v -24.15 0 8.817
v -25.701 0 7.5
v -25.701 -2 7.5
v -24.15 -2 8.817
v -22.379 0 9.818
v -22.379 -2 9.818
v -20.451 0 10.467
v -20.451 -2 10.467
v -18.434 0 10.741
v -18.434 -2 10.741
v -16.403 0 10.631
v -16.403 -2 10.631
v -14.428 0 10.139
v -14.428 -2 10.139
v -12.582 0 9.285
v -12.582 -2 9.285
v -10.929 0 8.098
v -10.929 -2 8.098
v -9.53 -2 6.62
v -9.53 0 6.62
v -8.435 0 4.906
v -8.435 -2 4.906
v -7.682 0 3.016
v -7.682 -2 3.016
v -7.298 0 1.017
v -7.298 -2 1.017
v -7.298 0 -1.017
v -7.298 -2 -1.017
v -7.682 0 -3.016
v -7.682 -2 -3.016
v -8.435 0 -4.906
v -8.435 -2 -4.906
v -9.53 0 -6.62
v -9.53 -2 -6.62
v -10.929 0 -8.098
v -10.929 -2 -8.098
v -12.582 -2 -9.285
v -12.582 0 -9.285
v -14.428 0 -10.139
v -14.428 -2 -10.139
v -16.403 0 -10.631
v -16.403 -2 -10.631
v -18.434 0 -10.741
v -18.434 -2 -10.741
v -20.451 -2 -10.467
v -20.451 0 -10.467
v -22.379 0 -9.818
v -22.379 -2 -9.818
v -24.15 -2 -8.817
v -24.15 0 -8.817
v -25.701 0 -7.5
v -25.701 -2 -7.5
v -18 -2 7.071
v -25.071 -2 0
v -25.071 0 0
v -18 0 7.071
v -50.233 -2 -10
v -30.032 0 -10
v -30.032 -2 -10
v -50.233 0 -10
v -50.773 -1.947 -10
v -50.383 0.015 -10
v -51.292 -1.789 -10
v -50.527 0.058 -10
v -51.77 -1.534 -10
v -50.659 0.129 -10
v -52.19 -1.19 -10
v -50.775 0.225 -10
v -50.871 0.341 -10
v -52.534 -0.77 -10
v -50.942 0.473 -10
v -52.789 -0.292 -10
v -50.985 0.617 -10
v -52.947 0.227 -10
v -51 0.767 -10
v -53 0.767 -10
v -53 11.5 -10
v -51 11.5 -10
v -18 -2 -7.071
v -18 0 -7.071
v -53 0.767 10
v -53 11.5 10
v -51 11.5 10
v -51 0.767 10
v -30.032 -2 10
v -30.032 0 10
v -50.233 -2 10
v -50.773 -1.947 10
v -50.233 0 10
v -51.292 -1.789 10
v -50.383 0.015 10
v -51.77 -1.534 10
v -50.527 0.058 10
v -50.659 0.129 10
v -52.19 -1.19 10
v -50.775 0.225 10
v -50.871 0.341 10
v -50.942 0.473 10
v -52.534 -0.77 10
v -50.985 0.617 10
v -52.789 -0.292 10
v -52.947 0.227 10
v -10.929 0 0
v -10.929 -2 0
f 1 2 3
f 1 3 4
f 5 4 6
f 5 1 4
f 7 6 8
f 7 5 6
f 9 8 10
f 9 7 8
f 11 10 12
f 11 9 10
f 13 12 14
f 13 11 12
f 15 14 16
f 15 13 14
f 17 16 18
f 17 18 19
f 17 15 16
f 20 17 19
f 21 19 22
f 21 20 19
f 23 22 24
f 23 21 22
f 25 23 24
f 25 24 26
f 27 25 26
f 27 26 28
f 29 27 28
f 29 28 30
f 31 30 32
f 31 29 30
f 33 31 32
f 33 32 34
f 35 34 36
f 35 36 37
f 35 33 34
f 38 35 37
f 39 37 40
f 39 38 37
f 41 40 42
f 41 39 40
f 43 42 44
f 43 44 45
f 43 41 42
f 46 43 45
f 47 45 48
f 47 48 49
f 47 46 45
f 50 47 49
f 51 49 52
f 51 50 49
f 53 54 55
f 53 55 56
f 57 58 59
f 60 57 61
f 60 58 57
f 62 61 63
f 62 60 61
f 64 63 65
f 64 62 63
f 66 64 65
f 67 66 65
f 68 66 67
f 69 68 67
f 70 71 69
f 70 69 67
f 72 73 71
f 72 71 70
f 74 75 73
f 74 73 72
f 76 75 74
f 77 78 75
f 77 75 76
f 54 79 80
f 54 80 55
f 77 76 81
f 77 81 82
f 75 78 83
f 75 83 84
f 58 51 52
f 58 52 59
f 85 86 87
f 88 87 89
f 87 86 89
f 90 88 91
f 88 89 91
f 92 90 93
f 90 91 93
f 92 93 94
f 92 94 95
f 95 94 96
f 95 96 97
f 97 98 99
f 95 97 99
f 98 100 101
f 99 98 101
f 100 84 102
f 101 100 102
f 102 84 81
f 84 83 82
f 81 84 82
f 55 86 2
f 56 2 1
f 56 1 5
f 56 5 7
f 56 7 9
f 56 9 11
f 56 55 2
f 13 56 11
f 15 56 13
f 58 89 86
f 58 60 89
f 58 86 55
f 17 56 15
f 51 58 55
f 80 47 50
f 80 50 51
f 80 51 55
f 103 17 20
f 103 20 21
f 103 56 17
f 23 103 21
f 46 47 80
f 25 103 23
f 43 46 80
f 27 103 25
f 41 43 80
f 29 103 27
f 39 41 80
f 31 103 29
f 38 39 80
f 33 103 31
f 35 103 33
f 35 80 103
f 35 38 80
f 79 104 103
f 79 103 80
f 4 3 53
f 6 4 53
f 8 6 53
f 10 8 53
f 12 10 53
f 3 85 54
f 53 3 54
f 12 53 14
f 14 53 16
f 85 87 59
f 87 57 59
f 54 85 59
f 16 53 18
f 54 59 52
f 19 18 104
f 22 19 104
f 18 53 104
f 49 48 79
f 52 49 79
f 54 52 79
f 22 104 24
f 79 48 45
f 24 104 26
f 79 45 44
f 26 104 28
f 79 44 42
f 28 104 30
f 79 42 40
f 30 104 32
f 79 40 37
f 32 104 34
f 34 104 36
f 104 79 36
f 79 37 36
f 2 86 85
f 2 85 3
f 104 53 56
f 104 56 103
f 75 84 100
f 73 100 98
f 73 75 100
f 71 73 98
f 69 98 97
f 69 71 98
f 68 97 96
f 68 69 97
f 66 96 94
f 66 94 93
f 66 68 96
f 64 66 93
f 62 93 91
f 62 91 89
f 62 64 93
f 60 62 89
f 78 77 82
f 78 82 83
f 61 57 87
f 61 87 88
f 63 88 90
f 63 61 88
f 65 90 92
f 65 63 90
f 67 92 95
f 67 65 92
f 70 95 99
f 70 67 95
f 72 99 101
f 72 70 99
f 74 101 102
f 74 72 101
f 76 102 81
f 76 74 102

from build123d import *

# Parameters (mm, degrees)
SM_BASE_FLANGE_1_DEPTH           = 2
SM_EDGE_FLANGE_1_STRIP_W         = 9.5332
SM_EDGE_FLANGE_1_STRIP_H         = 2
SM_EDGE_FLANGE_1_STRIP_CUT_DEPTH = 20
SM_EDGE_FLANGE_1_DEPTH           = 20
CUT_EXTRUDE_1_DEPTH              = 57.15881498


# Sheet-metal steps are written as plain solids
with BuildPart() as part:
    # Sketch 2 → 基体-法兰1 (new body)
    with BuildSketch(Plane(origin=(0, 0, 0), x_dir=(1, 0, 0), z_dir=(0, 1, 0))):
        with BuildLine():
            Line((-30.031587919, -10), (-25.7014609, -7.5))
            ThreePointArc((-25.7014609, -7.5), (-7.25, 0), (-25.7014609, 7.5))
            Line((-25.7014609, 7.5), (-30.031587919, 10))
            Line((-30.031587919, 10), (-53, 10))
            Line((-53, 10), (-53, -10))
            Line((-53, -10), (-30.031587919, -10))
        make_face()
    extrude(amount=-SM_BASE_FLANGE_1_DEPTH)

    # 边线-法兰1 strip (across the edge) → 边线-法兰1 strip cut (cut)
    with BuildSketch(Plane(origin=(-53, 0, -10), x_dir=(1, 0, 0), z_dir=(0, 0, 1))):
        with Locations((-2, -1)):
            Rectangle(SM_EDGE_FLANGE_1_STRIP_W, SM_EDGE_FLANGE_1_STRIP_H)
    extrude(amount=SM_EDGE_FLANGE_1_STRIP_CUT_DEPTH, mode=Mode.SUBTRACT)

    # 边线-法兰1 section (across the edge) → 边线-法兰1 (add)
    with BuildSketch(Plane(origin=(-53, 0, -10), x_dir=(1, 0, 0), z_dir=(0, 0, 1))):
        with BuildLine():
            Line((0, 0.7666), (0, 11.5))
            Line((0, 11.5), (2, 11.5))
            Line((2, 11.5), (2, 0.7666))
            ThreePointArc((2, 0.7666), (2.224531942, 0.224531942), (2.7666, 0))
            Line((2.7666, 0), (2.7666, -2))
            ThreePointArc((2.7666, -2), (0.810318379, -1.189681621), (0, 0.7666))
        make_face()
    extrude(amount=SM_EDGE_FLANGE_1_DEPTH)

    # 草图10 → 切除-拉伸1 (cut, through all)
    with BuildSketch(Plane(origin=(0, -2, -2), x_dir=(1, 0, 0), z_dir=(0, 1, 0))):
        Polygon((-18, 5.071067812), (-25.071067812, -2), (-18, -9.071067812), (-10.928932188, -2), align=None)
    extrude(amount=CUT_EXTRUDE_1_DEPTH, mode=Mode.SUBTRACT)


solid = part.part
